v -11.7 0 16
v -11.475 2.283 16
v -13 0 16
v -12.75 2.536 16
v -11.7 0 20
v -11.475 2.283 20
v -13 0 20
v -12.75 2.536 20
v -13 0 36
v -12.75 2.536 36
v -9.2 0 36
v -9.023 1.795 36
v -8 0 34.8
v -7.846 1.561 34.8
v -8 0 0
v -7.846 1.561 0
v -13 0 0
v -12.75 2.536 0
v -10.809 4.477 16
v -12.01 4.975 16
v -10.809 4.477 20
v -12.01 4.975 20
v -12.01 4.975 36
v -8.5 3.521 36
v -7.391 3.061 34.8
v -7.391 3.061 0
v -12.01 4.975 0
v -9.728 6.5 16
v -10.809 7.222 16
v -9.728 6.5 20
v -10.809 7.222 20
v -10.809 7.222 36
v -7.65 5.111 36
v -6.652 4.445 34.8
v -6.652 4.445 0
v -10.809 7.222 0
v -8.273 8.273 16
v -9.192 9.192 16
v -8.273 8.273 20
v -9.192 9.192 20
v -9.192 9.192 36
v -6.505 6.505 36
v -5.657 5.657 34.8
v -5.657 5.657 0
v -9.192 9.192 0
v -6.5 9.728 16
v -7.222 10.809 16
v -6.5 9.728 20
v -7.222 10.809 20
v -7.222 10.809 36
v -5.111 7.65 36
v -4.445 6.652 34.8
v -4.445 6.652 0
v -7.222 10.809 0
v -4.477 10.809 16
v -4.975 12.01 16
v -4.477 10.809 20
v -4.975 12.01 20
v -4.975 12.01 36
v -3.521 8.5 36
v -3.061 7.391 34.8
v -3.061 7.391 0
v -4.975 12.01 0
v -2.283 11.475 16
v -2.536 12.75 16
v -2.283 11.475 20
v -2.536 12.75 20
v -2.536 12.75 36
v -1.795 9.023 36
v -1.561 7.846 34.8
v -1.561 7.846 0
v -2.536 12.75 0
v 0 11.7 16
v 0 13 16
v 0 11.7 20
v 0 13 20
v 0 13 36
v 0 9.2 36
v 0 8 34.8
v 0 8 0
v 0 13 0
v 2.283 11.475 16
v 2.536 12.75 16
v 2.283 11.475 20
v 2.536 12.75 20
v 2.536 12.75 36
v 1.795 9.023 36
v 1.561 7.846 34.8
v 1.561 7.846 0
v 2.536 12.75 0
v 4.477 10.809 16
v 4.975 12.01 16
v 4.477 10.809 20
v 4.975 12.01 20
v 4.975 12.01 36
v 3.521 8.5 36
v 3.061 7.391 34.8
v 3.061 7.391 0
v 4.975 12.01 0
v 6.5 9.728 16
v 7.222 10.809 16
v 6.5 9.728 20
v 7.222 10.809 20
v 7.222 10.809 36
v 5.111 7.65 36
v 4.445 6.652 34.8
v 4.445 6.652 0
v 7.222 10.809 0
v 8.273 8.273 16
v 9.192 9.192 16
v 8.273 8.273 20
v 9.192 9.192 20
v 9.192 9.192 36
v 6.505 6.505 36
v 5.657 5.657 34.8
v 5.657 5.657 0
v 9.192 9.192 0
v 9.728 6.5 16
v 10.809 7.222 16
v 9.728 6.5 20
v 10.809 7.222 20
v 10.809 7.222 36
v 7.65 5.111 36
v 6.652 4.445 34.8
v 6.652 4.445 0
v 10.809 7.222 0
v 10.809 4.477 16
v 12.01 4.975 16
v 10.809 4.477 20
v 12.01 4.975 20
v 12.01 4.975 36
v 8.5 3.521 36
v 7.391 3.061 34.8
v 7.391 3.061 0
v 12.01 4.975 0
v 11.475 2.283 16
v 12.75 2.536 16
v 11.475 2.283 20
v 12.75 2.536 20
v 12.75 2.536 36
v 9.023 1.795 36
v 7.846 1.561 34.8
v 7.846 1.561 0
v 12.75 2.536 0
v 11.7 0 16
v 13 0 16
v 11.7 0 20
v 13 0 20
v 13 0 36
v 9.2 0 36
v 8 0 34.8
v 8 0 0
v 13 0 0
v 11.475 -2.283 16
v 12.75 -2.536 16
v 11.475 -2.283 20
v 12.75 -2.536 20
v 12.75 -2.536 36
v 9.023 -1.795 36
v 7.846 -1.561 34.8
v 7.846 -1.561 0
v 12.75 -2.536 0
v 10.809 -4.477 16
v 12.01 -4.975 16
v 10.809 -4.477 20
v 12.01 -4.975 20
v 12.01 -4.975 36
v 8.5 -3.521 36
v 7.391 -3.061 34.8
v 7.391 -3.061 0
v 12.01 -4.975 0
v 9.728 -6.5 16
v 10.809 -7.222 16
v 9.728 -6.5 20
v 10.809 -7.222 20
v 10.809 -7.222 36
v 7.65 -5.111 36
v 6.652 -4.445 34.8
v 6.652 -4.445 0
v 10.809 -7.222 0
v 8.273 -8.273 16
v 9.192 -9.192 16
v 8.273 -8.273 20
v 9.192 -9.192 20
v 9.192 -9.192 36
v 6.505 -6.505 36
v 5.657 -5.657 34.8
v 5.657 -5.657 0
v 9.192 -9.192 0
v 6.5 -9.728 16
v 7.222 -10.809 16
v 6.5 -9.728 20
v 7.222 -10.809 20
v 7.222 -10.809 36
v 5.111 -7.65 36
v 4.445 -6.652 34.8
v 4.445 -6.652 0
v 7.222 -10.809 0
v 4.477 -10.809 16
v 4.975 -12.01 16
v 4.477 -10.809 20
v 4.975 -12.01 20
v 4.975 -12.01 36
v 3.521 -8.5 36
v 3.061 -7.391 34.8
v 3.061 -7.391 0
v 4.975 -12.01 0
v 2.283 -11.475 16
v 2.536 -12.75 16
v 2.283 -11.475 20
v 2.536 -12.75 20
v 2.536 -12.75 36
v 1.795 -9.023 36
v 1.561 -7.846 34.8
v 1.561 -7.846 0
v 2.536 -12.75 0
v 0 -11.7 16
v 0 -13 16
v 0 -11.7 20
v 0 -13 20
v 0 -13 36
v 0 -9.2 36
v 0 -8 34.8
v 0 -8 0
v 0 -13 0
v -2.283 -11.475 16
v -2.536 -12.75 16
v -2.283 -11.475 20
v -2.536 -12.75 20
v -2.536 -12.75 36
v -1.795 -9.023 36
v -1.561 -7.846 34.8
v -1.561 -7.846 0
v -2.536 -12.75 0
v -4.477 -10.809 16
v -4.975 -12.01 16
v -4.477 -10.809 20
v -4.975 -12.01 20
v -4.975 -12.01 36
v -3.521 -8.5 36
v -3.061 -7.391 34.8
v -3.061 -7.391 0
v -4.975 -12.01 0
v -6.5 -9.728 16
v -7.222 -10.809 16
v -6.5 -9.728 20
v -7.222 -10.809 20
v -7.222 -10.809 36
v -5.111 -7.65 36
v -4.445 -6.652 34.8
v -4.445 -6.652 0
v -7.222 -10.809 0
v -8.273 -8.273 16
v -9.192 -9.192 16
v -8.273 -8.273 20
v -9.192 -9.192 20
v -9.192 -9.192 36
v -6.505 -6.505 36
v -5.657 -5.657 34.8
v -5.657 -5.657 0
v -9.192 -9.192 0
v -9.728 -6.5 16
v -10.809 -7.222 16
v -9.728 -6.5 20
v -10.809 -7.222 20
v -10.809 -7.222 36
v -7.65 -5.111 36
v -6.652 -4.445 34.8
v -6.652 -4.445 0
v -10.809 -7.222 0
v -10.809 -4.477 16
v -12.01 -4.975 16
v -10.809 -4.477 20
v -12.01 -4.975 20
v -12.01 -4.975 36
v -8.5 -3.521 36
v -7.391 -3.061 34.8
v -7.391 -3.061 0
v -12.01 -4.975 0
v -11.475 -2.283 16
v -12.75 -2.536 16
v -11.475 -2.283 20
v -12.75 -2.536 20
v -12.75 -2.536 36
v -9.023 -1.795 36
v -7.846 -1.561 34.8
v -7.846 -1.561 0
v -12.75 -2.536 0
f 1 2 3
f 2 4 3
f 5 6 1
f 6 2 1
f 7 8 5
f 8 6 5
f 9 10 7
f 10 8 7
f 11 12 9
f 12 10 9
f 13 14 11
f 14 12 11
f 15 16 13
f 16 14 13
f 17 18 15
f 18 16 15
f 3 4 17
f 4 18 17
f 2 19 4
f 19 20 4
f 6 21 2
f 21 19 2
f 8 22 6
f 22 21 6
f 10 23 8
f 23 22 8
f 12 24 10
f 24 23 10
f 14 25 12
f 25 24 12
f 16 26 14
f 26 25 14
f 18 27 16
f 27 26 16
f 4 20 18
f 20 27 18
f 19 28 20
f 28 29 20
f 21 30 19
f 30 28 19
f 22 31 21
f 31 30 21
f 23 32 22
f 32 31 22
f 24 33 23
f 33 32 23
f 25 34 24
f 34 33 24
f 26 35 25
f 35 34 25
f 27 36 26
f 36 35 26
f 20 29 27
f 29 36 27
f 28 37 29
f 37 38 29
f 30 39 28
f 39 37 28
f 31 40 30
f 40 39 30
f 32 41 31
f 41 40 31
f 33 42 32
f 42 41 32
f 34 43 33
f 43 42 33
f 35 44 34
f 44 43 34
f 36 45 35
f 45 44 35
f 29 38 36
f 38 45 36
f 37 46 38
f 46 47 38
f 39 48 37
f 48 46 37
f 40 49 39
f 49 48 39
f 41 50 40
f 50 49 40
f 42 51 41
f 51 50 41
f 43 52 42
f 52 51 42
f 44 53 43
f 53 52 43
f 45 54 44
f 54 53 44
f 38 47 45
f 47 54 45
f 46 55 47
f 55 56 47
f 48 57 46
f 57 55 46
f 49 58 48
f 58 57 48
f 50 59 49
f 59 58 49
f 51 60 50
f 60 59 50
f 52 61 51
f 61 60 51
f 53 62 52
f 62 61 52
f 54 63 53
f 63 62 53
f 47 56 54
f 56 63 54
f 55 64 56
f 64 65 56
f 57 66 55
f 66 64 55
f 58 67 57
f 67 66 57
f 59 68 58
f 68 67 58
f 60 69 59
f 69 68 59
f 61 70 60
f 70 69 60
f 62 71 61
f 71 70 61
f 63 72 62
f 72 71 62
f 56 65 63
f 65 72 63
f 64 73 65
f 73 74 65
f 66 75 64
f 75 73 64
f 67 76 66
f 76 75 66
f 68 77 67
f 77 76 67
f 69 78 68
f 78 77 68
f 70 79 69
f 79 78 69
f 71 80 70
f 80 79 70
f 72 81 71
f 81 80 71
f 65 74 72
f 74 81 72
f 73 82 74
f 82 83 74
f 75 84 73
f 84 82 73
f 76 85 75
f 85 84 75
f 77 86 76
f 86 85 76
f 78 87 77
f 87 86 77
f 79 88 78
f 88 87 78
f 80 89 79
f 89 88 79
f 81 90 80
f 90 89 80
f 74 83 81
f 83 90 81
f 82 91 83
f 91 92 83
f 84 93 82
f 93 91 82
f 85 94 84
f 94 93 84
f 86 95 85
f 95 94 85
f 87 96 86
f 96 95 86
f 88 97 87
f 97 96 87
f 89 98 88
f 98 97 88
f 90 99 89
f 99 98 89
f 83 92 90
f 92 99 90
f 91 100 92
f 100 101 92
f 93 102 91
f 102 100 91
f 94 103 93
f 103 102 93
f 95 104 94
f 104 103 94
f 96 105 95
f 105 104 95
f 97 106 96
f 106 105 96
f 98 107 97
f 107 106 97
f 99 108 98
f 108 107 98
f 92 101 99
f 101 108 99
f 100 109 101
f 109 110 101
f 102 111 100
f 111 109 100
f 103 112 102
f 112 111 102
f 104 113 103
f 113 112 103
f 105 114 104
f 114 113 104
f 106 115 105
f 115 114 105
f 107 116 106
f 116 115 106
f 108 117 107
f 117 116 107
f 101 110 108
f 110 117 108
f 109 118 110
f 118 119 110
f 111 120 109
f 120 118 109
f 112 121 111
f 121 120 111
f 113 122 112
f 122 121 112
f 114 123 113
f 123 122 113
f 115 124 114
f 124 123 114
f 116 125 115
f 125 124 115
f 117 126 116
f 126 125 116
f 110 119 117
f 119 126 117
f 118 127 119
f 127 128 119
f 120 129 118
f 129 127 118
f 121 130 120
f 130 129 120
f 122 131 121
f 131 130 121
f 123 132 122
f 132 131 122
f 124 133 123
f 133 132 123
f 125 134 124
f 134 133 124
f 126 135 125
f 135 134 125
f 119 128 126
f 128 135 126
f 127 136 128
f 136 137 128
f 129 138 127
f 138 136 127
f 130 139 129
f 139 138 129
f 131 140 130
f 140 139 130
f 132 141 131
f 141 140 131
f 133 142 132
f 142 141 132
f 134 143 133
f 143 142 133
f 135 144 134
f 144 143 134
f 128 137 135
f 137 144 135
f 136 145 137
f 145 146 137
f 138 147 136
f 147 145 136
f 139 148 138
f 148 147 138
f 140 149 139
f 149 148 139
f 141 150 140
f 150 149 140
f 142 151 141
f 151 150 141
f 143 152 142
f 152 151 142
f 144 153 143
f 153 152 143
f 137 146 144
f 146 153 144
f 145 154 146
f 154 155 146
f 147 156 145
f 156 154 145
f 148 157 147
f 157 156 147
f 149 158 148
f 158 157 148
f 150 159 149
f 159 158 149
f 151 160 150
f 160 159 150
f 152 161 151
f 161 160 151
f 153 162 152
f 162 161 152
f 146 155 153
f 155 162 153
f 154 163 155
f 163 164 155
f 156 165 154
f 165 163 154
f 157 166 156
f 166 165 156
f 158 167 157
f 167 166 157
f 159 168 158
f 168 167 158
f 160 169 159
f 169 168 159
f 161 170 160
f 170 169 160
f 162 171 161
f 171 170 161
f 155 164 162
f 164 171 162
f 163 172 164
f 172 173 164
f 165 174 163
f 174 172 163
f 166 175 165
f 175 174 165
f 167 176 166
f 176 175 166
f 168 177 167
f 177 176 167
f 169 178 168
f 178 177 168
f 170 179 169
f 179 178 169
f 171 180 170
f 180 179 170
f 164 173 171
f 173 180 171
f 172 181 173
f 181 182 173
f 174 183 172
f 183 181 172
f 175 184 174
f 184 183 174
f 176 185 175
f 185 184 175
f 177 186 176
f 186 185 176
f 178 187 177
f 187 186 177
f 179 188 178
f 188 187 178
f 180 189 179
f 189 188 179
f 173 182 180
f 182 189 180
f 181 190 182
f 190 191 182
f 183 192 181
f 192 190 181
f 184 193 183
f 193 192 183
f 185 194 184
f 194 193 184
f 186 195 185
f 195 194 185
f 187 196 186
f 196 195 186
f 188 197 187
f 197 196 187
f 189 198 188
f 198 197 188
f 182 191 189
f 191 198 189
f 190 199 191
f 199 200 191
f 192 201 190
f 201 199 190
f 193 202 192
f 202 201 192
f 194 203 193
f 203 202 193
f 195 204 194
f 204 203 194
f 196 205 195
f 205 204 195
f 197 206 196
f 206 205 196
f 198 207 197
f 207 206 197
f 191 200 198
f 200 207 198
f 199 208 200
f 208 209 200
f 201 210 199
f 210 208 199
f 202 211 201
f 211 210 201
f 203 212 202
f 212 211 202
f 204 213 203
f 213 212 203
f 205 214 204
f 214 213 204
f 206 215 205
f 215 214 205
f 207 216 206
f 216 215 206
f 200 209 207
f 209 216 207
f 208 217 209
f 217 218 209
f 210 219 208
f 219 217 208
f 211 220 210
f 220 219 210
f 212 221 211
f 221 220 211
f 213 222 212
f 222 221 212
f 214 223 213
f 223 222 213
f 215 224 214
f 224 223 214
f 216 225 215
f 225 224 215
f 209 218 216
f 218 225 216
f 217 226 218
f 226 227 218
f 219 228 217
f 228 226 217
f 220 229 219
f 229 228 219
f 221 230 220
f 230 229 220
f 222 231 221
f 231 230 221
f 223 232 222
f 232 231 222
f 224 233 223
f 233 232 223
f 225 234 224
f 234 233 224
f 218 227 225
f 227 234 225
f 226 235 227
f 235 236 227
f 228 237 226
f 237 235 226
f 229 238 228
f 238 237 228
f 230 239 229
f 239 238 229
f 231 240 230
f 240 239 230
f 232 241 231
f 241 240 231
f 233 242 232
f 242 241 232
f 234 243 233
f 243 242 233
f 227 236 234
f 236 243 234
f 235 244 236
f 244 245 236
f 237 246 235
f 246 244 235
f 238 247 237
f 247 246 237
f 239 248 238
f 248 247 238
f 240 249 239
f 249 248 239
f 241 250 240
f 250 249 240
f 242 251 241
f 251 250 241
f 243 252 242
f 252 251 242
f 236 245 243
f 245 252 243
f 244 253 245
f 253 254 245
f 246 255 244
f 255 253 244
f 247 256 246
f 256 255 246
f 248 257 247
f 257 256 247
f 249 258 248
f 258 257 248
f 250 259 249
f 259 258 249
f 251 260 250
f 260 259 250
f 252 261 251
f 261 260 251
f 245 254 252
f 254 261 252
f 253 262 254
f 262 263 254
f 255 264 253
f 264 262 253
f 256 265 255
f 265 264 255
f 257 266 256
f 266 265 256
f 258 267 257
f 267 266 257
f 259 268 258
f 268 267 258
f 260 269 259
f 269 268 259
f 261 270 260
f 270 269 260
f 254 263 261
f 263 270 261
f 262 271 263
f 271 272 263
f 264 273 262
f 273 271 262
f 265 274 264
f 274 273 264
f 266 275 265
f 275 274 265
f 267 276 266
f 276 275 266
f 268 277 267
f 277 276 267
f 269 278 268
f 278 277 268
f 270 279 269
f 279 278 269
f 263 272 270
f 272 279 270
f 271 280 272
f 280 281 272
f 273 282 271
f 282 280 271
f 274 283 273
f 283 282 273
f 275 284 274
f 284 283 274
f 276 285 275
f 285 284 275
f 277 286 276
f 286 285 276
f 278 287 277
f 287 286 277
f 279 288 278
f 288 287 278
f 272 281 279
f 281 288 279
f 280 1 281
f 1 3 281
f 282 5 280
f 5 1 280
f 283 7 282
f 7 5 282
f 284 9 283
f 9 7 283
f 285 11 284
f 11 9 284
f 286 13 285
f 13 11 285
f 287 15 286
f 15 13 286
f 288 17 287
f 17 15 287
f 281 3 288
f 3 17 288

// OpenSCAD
$fn = 32;

// ----------------------------------------------------------------------
// Grooved revolve: thread_relief, bore R8
// ----------------------------------------------------------------------

// --- parameters (mm) ---
bore_r = 8;               // bore radius
outer_r = 13;             // outer radius of the body
total_h = 36;             // overall height, Z
wall = 5;                 // radial wall thickness
groove_w = 4;             // groove width
groove_d = 1.3;           // groove depth
grooves = 1;              // number of outer grooves
relief = 1.2;             // thread relief leg at the bore mouth
relief_angle = 45;        // thread relief chamfer angle, degrees
fit_tol = 0.02;           // declared fit tolerance (prompt contract)
free_tol = 0.2;           // declared free tolerance (prompt contract)

bbox_x = 2 * outer_r;  // full diameter
bore_d = 2 * bore_r;  // bore diameter
body_d = 2 * outer_r;  // body diameter
revolve_angle = 360;  // full turn around the Z axis

profile = [[8, 0], [13, 0], [13, 16], [11.7, 16], [11.7, 20], [13, 20], [13, 36], [9.2, 36], [8, 34.8]];  // primary outline, 9 points, counter clockwise

// --- the one profile operation ---
rotate_extrude(angle = revolve_angle) polygon(points = profile);
